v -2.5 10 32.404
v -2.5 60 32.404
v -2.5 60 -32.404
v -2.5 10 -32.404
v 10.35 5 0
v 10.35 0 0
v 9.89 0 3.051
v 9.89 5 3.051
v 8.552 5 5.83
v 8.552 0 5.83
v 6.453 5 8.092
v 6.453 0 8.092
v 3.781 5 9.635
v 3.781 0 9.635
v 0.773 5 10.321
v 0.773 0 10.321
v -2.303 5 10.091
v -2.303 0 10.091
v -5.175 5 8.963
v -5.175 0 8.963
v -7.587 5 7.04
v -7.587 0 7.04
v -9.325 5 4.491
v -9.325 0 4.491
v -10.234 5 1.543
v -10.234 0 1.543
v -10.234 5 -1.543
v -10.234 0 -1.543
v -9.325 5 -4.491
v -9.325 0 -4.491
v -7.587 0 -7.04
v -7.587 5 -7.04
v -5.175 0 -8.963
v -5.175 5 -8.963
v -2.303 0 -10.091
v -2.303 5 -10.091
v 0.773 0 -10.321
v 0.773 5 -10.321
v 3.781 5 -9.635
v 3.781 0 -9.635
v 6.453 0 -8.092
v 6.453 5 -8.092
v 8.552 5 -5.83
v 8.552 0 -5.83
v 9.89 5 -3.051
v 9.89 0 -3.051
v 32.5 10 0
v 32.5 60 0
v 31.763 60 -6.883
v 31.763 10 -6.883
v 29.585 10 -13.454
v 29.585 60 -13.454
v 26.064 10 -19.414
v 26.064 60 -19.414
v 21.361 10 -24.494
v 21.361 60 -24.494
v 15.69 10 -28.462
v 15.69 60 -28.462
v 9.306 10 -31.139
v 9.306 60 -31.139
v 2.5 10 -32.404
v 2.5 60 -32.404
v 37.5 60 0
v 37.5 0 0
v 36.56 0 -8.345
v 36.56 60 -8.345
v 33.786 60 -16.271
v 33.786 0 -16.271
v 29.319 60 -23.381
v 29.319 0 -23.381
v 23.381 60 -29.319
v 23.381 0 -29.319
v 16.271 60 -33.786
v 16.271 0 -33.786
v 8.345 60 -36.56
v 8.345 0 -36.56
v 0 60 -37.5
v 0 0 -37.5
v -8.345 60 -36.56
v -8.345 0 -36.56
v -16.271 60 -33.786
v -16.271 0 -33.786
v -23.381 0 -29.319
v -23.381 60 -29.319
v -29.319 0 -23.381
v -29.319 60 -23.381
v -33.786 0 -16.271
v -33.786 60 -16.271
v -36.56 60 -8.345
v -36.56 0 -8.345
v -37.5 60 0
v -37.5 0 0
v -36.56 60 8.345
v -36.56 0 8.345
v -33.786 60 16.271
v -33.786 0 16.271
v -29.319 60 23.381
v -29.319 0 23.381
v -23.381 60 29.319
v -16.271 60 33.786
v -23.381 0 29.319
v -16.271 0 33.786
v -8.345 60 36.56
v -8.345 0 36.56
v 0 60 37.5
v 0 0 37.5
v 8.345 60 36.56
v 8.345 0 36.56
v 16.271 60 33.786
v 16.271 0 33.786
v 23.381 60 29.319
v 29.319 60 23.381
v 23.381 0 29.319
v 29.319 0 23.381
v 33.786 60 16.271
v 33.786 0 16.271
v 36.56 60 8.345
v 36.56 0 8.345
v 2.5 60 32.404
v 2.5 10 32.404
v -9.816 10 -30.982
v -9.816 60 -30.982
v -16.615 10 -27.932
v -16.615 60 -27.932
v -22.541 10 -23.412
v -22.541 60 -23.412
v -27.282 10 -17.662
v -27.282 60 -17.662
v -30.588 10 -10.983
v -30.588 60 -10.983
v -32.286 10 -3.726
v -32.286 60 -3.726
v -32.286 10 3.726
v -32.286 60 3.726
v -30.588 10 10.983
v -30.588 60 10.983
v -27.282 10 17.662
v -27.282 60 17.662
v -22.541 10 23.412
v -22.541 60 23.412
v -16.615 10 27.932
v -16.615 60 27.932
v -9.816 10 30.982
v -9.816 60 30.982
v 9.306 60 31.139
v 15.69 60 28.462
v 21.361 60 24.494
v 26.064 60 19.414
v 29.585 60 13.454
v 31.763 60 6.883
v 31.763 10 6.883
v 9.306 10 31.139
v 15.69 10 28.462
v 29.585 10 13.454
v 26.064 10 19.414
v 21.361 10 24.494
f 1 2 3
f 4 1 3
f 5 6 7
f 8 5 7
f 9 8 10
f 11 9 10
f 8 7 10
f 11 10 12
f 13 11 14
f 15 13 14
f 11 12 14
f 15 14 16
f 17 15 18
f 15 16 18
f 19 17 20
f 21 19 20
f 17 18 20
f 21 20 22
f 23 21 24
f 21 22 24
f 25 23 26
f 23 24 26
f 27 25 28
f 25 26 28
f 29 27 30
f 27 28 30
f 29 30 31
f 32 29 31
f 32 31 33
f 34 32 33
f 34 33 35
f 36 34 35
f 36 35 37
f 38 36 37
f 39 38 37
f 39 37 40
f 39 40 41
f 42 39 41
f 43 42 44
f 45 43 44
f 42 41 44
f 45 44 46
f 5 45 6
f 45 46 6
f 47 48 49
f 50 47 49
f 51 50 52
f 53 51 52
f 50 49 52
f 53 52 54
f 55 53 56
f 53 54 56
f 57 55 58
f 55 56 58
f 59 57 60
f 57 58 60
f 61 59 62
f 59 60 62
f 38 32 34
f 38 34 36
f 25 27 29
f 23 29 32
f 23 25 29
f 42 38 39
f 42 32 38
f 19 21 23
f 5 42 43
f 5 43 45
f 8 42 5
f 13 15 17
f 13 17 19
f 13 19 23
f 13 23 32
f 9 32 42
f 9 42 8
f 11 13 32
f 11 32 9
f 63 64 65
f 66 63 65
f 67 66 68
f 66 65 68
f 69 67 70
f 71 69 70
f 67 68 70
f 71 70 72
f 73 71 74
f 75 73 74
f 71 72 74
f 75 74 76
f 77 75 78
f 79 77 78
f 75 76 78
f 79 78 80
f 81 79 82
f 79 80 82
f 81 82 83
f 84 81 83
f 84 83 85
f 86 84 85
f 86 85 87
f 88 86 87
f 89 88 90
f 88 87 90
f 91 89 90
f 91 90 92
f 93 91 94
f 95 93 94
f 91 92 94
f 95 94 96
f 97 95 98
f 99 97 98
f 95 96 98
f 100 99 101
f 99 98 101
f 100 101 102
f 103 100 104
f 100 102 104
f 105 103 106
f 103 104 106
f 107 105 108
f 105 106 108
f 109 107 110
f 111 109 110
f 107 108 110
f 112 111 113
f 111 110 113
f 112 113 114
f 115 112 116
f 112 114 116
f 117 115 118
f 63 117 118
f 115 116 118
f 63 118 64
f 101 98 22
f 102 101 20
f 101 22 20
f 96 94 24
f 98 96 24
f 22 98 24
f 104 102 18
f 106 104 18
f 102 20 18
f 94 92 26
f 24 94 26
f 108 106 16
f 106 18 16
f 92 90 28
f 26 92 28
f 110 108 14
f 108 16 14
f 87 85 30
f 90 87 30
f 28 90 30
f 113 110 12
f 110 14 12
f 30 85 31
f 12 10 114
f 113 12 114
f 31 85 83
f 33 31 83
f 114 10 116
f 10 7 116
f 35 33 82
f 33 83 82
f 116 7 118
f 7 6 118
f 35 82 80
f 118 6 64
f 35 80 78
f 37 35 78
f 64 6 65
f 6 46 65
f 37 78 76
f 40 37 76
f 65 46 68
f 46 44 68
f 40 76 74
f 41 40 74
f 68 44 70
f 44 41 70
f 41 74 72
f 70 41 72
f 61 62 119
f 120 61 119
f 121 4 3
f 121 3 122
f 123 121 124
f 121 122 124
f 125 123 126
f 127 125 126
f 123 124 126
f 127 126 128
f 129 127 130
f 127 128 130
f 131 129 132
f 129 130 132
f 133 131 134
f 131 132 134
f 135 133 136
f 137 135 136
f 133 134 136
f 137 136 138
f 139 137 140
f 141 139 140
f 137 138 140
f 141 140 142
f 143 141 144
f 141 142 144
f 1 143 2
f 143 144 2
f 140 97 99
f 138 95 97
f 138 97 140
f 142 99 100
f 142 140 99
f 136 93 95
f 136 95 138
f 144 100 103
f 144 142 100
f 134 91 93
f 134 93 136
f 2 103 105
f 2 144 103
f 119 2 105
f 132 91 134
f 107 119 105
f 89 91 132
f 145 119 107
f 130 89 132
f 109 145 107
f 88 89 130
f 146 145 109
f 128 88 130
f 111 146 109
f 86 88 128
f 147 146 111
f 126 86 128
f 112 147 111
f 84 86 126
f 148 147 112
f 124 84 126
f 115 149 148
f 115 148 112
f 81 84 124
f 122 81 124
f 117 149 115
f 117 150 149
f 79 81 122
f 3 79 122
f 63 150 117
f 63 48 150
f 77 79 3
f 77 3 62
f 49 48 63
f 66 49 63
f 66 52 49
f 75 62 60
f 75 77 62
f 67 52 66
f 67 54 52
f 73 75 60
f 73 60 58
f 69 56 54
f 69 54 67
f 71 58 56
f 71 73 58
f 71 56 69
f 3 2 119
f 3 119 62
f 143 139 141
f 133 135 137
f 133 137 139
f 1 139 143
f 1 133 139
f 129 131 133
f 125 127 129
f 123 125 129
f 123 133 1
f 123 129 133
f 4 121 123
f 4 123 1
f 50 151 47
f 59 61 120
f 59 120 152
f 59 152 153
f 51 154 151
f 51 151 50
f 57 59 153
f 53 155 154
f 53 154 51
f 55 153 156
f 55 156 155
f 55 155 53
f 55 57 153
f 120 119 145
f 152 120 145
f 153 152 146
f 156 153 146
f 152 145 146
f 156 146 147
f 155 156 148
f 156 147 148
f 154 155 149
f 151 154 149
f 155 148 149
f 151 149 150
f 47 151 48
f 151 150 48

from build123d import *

# Parameters (mm, degrees)
SKETCH1_R           = 37.5
BOSS_EXTRUDE1_DEPTH = 60
CUT_EXTRUDE1_DEPTH  = 50
SKETCH3_R           = 10.35
CUT_EXTRUDE2_DEPTH  = 5


with BuildPart() as part:
    # Sketch1 → Boss-Extrude1 (new body)
    with BuildSketch(Plane(origin=(0, 0, 0), x_dir=(1, 0, 0), z_dir=(0, 1, 0))):
        Circle(SKETCH1_R)
    extrude(amount=BOSS_EXTRUDE1_DEPTH)

    # Sketch2 → Cut-Extrude1 (cut)
    with BuildSketch(Plane(origin=(0, 60, 0), x_dir=(1, 0, 0), z_dir=(0, 1, 0))):
        with BuildLine():
            Line((-2.5, -32.403703492), (-2.5, 32.403703492))
            ThreePointArc((-2.5, 32.403703492), (-32.5, 0), (-2.5, -32.403703492))
        make_face()
        with BuildLine():
            ThreePointArc((32.5, 0), (23.848480035, 22.079402166), (2.5, 32.403703492))
            Line((2.5, 32.403703492), (2.5, -32.403703492))
            ThreePointArc((2.5, -32.403703492), (23.848480035, -22.079402166), (32.5, 0))
        make_face()
    extrude(amount=-CUT_EXTRUDE1_DEPTH, mode=Mode.SUBTRACT)

    # Sketch3 → Cut-Extrude2 (cut)
    with BuildSketch(Plane.XZ):
        Circle(SKETCH3_R)
    extrude(amount=-CUT_EXTRUDE2_DEPTH, mode=Mode.SUBTRACT)


solid = part.part
